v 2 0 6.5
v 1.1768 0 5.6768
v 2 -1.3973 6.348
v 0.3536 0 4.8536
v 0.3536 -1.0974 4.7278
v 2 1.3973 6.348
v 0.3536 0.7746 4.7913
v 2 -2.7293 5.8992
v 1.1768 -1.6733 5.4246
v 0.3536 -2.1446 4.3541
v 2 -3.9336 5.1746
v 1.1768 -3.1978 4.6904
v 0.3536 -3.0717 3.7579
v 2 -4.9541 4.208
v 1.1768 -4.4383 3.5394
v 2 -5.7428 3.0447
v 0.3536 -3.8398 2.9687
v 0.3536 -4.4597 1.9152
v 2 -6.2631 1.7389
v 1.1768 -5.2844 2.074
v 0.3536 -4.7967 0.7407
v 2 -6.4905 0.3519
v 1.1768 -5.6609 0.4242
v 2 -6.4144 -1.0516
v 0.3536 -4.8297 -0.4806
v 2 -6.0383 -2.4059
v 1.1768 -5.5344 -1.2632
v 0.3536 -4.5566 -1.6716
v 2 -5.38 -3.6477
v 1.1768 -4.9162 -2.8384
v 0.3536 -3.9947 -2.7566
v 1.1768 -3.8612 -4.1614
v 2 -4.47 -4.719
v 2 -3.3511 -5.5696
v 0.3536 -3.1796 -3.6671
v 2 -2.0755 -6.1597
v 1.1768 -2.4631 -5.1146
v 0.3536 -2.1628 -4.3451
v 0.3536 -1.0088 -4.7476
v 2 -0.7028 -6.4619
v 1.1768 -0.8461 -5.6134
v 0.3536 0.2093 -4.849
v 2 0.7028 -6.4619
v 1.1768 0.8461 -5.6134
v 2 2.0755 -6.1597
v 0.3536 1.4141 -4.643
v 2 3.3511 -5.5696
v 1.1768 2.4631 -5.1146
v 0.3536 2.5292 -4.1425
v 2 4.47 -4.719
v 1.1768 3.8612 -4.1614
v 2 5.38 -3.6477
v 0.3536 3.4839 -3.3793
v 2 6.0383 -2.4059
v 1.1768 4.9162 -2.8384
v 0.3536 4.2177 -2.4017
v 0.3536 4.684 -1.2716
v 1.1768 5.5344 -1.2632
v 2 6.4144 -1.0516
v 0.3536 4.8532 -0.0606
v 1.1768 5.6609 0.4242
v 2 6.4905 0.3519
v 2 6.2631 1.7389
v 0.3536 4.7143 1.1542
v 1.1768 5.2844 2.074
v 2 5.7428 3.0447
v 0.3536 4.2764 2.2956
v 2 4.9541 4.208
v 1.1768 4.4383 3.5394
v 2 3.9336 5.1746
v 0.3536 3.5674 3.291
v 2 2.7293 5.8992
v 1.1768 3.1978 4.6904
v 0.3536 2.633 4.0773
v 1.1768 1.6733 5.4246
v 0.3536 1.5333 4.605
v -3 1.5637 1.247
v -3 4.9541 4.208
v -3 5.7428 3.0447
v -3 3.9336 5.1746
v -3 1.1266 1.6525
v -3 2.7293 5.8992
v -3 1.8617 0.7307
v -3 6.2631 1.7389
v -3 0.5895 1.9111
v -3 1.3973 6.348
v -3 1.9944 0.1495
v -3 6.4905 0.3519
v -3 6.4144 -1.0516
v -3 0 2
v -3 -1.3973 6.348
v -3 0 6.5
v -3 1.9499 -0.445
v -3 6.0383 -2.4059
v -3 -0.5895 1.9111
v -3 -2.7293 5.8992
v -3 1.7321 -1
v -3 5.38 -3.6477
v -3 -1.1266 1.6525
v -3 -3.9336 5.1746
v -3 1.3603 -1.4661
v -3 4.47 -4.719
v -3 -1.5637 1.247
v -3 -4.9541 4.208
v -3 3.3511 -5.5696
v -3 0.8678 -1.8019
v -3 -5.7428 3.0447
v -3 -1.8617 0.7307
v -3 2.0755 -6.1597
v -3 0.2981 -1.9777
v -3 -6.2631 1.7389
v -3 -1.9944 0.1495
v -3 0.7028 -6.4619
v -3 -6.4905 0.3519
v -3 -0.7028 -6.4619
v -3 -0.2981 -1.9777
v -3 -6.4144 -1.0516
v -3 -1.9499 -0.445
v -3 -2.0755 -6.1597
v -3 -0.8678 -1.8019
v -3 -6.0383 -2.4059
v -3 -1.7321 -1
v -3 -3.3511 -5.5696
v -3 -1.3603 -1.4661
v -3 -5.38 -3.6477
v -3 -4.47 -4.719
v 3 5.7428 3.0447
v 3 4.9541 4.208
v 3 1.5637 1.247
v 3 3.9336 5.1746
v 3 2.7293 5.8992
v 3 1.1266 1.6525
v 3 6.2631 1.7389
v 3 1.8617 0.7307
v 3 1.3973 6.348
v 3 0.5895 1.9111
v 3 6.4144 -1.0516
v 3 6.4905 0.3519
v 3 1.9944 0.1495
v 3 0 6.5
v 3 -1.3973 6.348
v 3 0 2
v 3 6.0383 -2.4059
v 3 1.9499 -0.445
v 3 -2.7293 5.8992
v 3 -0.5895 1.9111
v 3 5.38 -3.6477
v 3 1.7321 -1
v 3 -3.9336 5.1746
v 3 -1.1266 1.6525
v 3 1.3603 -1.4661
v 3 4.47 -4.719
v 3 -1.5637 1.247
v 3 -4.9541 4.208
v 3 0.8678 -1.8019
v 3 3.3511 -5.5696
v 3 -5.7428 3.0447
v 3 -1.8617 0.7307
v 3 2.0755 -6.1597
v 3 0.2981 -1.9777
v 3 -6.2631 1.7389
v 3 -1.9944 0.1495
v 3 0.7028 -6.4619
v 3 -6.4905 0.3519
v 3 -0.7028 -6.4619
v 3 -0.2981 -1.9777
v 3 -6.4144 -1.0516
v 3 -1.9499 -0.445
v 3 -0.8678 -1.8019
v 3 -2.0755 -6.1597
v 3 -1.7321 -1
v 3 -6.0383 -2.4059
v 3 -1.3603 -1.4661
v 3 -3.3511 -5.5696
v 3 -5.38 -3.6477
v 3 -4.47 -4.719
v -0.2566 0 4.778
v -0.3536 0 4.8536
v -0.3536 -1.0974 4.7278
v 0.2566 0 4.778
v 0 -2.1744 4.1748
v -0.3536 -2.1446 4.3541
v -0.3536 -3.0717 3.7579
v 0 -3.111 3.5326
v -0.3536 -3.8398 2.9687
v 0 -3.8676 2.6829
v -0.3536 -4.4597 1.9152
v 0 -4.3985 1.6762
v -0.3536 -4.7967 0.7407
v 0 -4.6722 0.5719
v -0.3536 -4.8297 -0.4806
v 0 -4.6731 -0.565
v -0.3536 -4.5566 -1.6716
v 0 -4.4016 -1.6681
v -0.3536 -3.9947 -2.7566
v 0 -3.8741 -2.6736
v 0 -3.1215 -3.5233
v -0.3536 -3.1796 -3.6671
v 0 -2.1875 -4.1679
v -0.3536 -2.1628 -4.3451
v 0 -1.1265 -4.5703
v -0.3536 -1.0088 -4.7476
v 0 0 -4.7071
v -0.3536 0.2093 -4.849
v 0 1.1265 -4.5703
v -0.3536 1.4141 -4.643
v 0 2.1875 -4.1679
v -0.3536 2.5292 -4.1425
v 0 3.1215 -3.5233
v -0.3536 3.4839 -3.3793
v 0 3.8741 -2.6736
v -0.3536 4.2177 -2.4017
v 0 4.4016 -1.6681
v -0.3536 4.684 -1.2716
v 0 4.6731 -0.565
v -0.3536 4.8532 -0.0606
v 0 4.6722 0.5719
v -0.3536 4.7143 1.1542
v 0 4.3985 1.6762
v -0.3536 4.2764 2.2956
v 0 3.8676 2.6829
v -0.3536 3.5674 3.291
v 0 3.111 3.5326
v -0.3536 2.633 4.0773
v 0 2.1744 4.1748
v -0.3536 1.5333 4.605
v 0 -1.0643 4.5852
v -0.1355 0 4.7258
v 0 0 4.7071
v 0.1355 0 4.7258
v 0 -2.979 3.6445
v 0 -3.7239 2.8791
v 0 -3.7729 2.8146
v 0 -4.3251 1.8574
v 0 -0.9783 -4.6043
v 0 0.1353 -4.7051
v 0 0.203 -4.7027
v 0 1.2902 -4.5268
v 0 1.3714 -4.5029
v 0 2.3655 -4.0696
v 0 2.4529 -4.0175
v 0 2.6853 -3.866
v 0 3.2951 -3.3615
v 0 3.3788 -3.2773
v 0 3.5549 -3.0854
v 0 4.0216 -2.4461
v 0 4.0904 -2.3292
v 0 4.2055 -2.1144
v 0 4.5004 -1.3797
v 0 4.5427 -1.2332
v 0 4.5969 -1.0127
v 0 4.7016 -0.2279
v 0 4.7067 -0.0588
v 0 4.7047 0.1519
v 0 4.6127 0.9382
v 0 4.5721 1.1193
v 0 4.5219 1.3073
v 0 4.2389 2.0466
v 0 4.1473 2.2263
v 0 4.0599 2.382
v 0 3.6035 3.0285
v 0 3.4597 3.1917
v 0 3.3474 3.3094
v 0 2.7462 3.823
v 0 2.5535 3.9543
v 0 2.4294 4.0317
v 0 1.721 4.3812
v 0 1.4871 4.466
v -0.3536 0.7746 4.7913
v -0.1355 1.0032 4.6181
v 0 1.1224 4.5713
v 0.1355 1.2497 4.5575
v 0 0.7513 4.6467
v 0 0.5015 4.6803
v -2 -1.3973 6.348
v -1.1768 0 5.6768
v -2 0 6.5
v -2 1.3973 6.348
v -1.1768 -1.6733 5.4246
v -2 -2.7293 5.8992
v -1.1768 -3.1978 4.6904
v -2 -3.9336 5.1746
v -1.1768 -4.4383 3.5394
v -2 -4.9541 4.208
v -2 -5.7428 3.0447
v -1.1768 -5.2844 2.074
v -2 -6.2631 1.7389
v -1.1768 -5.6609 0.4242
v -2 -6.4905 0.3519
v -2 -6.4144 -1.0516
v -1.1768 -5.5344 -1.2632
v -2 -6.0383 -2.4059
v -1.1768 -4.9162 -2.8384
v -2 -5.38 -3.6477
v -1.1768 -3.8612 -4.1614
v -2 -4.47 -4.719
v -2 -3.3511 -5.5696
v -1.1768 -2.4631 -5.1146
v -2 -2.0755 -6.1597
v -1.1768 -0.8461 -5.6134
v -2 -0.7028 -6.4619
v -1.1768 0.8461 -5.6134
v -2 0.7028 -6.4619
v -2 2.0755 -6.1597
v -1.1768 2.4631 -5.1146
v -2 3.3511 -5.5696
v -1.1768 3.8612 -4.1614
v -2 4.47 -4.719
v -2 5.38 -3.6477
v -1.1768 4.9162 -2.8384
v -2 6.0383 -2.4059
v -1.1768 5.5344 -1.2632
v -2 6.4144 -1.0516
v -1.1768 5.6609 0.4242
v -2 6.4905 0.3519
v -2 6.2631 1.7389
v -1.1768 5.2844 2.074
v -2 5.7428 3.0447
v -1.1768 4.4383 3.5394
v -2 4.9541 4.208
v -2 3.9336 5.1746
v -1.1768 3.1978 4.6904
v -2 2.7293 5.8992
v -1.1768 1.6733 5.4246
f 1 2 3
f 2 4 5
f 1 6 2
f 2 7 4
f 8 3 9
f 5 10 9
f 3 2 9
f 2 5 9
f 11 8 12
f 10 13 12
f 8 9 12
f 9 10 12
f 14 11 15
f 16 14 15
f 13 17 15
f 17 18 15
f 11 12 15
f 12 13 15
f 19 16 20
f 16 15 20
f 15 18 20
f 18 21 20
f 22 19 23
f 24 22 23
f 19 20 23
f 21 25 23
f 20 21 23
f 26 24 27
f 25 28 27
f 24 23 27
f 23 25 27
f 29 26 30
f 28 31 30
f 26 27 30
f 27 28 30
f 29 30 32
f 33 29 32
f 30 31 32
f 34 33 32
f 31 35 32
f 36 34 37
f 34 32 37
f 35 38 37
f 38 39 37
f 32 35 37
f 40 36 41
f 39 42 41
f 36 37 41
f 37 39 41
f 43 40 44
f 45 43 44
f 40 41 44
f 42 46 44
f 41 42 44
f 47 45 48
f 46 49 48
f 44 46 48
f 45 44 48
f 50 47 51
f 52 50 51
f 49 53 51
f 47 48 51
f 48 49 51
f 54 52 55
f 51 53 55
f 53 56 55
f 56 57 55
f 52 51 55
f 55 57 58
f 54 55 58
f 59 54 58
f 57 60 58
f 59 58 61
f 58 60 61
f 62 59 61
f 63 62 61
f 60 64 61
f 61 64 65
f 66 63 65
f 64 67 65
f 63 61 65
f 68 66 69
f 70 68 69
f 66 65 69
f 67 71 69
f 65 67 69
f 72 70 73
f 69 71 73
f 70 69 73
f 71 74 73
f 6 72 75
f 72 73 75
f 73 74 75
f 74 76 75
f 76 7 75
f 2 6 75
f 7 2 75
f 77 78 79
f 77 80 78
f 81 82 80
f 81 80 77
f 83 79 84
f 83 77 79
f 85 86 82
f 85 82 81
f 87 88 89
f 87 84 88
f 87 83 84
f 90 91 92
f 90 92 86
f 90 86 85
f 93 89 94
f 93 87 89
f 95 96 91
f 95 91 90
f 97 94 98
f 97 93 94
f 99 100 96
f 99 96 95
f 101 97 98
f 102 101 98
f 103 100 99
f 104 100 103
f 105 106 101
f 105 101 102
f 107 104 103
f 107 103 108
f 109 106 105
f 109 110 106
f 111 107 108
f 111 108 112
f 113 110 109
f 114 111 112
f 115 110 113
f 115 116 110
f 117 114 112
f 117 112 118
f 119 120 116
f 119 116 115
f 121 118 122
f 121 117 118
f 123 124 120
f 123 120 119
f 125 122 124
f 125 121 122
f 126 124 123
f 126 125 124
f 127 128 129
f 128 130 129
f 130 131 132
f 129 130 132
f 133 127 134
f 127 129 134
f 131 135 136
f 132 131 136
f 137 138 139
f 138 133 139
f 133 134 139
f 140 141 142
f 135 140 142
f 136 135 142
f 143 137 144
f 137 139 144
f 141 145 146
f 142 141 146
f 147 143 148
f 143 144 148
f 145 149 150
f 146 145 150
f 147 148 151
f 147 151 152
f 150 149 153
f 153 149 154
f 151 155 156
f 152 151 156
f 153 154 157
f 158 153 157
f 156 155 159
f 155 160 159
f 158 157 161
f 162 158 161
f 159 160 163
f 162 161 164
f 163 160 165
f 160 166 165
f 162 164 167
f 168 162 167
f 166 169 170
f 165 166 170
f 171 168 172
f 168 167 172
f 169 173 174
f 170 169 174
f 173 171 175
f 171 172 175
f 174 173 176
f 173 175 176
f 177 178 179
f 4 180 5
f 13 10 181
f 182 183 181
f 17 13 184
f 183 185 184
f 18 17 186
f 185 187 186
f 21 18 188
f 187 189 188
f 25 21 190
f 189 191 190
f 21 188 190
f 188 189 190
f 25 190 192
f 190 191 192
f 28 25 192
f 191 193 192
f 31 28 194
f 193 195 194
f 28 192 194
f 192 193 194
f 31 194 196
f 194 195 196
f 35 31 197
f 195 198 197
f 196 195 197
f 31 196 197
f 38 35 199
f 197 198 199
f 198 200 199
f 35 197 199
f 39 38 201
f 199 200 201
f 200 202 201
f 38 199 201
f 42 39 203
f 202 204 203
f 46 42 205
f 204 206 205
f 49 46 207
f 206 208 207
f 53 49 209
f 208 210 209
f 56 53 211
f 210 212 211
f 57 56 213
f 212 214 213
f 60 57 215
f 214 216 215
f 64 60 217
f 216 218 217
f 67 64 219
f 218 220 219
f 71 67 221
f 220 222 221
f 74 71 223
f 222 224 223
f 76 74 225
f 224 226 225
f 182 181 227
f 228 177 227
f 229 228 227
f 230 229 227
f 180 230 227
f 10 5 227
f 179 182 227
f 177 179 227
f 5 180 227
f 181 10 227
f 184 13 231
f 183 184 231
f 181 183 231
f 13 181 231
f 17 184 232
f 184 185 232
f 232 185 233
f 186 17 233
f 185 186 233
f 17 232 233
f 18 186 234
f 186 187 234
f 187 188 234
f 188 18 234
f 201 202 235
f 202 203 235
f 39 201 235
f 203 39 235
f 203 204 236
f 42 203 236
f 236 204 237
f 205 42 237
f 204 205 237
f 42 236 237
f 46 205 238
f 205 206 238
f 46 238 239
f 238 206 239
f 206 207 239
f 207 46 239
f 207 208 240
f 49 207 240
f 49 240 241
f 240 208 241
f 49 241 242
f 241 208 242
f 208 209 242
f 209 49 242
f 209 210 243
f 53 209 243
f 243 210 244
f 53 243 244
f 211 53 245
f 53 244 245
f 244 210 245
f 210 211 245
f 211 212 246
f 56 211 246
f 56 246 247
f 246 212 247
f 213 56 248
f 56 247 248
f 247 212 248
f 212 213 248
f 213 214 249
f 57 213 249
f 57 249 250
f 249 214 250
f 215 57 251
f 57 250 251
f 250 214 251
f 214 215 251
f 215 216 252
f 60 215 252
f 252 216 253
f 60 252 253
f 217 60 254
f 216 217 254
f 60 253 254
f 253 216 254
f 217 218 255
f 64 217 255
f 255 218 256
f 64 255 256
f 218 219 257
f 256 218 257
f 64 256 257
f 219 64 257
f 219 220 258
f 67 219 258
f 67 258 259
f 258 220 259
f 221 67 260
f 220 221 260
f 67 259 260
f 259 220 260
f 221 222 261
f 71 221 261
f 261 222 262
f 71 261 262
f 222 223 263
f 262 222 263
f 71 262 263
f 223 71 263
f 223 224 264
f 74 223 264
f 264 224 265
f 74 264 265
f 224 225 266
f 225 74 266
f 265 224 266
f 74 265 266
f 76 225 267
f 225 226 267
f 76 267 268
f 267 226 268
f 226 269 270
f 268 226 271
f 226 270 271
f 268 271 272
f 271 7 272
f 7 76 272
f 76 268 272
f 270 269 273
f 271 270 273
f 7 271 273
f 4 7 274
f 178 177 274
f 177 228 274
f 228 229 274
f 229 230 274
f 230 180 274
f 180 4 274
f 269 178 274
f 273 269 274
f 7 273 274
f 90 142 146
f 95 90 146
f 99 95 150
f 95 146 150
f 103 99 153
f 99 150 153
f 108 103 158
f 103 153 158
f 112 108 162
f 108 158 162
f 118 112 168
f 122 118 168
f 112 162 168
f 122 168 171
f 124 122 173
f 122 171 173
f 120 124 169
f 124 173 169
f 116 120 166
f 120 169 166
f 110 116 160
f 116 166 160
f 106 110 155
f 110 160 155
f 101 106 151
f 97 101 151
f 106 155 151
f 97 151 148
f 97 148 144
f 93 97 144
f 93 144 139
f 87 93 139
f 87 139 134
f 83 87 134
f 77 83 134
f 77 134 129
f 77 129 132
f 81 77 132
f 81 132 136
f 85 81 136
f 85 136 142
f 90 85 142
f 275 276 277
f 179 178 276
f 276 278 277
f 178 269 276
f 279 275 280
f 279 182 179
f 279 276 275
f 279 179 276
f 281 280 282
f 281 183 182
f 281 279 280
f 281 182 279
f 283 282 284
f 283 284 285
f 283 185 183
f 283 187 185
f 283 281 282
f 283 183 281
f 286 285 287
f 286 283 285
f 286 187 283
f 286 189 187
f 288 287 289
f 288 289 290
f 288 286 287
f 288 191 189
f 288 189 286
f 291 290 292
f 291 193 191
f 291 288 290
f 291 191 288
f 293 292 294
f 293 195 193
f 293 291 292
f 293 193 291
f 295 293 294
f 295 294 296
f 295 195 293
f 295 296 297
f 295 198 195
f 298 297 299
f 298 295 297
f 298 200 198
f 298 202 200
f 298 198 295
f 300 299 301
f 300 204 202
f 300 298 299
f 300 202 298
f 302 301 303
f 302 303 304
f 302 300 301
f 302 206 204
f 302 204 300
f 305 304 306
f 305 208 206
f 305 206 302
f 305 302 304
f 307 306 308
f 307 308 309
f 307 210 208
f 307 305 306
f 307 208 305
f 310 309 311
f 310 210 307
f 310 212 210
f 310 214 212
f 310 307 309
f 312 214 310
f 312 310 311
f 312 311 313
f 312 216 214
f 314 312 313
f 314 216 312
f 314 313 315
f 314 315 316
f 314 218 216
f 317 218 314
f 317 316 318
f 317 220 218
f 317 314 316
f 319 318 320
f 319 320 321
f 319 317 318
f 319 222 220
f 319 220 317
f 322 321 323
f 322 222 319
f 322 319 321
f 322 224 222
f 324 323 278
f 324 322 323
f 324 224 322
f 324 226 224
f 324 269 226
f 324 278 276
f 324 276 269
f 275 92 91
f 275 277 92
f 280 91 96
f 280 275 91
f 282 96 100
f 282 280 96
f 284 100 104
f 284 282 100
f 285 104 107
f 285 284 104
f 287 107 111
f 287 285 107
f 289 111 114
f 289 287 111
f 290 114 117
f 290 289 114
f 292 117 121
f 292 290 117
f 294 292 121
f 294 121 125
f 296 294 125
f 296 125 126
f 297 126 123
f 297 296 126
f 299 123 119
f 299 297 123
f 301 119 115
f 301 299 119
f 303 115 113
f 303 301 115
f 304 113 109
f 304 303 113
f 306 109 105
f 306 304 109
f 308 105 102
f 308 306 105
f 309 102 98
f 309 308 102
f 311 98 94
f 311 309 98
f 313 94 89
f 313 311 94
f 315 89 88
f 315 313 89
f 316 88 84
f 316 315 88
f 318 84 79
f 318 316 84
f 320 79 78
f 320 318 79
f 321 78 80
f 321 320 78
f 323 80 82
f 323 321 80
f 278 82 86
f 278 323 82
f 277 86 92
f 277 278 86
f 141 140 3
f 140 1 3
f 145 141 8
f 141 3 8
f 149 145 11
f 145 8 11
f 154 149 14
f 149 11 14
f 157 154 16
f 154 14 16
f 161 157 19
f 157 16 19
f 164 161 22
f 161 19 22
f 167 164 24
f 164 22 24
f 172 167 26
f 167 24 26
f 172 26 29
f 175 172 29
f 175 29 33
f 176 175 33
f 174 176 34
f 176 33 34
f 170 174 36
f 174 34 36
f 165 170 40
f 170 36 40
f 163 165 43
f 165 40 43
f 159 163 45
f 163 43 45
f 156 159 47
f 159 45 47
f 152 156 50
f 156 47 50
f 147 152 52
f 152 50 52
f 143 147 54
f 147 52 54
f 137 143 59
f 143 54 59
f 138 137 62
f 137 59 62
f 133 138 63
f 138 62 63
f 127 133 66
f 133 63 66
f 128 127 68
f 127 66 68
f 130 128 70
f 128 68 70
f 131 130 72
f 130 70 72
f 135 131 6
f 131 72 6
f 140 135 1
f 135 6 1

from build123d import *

# Parameters (mm, degrees)
FILLET_1_R = 0.5


with BuildPart() as part:
    # 草图1 → 旋转1 (revolve)
    with BuildSketch(Plane.XY, mode=Mode.PRIVATE) as revolve_1_sk:
        Polygon((0, 2), (-3, 2), (-3, 6.5), (-2, 6.5), (0, 4.5), align=None)
    revolve_1 = revolve(revolve_1_sk.sketch.rotate(Axis((-66.431667693, 0, 0), (1, 0, 0)), 90), axis=Axis((-66.431667693, 0, 0), (1, 0, 0)))

    # 镜向1: 旋转1 across plane
    add(revolve_1.mirror(Plane(origin=(0, 0, 0), x_dir=(0, 0, 1), z_dir=(1, 0, 0))))

    # 圆角1
    fillet_1_edges = [part.edges().sort_by_distance(p)[0] for p in [
        (0, 0, -4.5),
    ]]
    fillet(fillet_1_edges, radius=FILLET_1_R)


solid = part.part
